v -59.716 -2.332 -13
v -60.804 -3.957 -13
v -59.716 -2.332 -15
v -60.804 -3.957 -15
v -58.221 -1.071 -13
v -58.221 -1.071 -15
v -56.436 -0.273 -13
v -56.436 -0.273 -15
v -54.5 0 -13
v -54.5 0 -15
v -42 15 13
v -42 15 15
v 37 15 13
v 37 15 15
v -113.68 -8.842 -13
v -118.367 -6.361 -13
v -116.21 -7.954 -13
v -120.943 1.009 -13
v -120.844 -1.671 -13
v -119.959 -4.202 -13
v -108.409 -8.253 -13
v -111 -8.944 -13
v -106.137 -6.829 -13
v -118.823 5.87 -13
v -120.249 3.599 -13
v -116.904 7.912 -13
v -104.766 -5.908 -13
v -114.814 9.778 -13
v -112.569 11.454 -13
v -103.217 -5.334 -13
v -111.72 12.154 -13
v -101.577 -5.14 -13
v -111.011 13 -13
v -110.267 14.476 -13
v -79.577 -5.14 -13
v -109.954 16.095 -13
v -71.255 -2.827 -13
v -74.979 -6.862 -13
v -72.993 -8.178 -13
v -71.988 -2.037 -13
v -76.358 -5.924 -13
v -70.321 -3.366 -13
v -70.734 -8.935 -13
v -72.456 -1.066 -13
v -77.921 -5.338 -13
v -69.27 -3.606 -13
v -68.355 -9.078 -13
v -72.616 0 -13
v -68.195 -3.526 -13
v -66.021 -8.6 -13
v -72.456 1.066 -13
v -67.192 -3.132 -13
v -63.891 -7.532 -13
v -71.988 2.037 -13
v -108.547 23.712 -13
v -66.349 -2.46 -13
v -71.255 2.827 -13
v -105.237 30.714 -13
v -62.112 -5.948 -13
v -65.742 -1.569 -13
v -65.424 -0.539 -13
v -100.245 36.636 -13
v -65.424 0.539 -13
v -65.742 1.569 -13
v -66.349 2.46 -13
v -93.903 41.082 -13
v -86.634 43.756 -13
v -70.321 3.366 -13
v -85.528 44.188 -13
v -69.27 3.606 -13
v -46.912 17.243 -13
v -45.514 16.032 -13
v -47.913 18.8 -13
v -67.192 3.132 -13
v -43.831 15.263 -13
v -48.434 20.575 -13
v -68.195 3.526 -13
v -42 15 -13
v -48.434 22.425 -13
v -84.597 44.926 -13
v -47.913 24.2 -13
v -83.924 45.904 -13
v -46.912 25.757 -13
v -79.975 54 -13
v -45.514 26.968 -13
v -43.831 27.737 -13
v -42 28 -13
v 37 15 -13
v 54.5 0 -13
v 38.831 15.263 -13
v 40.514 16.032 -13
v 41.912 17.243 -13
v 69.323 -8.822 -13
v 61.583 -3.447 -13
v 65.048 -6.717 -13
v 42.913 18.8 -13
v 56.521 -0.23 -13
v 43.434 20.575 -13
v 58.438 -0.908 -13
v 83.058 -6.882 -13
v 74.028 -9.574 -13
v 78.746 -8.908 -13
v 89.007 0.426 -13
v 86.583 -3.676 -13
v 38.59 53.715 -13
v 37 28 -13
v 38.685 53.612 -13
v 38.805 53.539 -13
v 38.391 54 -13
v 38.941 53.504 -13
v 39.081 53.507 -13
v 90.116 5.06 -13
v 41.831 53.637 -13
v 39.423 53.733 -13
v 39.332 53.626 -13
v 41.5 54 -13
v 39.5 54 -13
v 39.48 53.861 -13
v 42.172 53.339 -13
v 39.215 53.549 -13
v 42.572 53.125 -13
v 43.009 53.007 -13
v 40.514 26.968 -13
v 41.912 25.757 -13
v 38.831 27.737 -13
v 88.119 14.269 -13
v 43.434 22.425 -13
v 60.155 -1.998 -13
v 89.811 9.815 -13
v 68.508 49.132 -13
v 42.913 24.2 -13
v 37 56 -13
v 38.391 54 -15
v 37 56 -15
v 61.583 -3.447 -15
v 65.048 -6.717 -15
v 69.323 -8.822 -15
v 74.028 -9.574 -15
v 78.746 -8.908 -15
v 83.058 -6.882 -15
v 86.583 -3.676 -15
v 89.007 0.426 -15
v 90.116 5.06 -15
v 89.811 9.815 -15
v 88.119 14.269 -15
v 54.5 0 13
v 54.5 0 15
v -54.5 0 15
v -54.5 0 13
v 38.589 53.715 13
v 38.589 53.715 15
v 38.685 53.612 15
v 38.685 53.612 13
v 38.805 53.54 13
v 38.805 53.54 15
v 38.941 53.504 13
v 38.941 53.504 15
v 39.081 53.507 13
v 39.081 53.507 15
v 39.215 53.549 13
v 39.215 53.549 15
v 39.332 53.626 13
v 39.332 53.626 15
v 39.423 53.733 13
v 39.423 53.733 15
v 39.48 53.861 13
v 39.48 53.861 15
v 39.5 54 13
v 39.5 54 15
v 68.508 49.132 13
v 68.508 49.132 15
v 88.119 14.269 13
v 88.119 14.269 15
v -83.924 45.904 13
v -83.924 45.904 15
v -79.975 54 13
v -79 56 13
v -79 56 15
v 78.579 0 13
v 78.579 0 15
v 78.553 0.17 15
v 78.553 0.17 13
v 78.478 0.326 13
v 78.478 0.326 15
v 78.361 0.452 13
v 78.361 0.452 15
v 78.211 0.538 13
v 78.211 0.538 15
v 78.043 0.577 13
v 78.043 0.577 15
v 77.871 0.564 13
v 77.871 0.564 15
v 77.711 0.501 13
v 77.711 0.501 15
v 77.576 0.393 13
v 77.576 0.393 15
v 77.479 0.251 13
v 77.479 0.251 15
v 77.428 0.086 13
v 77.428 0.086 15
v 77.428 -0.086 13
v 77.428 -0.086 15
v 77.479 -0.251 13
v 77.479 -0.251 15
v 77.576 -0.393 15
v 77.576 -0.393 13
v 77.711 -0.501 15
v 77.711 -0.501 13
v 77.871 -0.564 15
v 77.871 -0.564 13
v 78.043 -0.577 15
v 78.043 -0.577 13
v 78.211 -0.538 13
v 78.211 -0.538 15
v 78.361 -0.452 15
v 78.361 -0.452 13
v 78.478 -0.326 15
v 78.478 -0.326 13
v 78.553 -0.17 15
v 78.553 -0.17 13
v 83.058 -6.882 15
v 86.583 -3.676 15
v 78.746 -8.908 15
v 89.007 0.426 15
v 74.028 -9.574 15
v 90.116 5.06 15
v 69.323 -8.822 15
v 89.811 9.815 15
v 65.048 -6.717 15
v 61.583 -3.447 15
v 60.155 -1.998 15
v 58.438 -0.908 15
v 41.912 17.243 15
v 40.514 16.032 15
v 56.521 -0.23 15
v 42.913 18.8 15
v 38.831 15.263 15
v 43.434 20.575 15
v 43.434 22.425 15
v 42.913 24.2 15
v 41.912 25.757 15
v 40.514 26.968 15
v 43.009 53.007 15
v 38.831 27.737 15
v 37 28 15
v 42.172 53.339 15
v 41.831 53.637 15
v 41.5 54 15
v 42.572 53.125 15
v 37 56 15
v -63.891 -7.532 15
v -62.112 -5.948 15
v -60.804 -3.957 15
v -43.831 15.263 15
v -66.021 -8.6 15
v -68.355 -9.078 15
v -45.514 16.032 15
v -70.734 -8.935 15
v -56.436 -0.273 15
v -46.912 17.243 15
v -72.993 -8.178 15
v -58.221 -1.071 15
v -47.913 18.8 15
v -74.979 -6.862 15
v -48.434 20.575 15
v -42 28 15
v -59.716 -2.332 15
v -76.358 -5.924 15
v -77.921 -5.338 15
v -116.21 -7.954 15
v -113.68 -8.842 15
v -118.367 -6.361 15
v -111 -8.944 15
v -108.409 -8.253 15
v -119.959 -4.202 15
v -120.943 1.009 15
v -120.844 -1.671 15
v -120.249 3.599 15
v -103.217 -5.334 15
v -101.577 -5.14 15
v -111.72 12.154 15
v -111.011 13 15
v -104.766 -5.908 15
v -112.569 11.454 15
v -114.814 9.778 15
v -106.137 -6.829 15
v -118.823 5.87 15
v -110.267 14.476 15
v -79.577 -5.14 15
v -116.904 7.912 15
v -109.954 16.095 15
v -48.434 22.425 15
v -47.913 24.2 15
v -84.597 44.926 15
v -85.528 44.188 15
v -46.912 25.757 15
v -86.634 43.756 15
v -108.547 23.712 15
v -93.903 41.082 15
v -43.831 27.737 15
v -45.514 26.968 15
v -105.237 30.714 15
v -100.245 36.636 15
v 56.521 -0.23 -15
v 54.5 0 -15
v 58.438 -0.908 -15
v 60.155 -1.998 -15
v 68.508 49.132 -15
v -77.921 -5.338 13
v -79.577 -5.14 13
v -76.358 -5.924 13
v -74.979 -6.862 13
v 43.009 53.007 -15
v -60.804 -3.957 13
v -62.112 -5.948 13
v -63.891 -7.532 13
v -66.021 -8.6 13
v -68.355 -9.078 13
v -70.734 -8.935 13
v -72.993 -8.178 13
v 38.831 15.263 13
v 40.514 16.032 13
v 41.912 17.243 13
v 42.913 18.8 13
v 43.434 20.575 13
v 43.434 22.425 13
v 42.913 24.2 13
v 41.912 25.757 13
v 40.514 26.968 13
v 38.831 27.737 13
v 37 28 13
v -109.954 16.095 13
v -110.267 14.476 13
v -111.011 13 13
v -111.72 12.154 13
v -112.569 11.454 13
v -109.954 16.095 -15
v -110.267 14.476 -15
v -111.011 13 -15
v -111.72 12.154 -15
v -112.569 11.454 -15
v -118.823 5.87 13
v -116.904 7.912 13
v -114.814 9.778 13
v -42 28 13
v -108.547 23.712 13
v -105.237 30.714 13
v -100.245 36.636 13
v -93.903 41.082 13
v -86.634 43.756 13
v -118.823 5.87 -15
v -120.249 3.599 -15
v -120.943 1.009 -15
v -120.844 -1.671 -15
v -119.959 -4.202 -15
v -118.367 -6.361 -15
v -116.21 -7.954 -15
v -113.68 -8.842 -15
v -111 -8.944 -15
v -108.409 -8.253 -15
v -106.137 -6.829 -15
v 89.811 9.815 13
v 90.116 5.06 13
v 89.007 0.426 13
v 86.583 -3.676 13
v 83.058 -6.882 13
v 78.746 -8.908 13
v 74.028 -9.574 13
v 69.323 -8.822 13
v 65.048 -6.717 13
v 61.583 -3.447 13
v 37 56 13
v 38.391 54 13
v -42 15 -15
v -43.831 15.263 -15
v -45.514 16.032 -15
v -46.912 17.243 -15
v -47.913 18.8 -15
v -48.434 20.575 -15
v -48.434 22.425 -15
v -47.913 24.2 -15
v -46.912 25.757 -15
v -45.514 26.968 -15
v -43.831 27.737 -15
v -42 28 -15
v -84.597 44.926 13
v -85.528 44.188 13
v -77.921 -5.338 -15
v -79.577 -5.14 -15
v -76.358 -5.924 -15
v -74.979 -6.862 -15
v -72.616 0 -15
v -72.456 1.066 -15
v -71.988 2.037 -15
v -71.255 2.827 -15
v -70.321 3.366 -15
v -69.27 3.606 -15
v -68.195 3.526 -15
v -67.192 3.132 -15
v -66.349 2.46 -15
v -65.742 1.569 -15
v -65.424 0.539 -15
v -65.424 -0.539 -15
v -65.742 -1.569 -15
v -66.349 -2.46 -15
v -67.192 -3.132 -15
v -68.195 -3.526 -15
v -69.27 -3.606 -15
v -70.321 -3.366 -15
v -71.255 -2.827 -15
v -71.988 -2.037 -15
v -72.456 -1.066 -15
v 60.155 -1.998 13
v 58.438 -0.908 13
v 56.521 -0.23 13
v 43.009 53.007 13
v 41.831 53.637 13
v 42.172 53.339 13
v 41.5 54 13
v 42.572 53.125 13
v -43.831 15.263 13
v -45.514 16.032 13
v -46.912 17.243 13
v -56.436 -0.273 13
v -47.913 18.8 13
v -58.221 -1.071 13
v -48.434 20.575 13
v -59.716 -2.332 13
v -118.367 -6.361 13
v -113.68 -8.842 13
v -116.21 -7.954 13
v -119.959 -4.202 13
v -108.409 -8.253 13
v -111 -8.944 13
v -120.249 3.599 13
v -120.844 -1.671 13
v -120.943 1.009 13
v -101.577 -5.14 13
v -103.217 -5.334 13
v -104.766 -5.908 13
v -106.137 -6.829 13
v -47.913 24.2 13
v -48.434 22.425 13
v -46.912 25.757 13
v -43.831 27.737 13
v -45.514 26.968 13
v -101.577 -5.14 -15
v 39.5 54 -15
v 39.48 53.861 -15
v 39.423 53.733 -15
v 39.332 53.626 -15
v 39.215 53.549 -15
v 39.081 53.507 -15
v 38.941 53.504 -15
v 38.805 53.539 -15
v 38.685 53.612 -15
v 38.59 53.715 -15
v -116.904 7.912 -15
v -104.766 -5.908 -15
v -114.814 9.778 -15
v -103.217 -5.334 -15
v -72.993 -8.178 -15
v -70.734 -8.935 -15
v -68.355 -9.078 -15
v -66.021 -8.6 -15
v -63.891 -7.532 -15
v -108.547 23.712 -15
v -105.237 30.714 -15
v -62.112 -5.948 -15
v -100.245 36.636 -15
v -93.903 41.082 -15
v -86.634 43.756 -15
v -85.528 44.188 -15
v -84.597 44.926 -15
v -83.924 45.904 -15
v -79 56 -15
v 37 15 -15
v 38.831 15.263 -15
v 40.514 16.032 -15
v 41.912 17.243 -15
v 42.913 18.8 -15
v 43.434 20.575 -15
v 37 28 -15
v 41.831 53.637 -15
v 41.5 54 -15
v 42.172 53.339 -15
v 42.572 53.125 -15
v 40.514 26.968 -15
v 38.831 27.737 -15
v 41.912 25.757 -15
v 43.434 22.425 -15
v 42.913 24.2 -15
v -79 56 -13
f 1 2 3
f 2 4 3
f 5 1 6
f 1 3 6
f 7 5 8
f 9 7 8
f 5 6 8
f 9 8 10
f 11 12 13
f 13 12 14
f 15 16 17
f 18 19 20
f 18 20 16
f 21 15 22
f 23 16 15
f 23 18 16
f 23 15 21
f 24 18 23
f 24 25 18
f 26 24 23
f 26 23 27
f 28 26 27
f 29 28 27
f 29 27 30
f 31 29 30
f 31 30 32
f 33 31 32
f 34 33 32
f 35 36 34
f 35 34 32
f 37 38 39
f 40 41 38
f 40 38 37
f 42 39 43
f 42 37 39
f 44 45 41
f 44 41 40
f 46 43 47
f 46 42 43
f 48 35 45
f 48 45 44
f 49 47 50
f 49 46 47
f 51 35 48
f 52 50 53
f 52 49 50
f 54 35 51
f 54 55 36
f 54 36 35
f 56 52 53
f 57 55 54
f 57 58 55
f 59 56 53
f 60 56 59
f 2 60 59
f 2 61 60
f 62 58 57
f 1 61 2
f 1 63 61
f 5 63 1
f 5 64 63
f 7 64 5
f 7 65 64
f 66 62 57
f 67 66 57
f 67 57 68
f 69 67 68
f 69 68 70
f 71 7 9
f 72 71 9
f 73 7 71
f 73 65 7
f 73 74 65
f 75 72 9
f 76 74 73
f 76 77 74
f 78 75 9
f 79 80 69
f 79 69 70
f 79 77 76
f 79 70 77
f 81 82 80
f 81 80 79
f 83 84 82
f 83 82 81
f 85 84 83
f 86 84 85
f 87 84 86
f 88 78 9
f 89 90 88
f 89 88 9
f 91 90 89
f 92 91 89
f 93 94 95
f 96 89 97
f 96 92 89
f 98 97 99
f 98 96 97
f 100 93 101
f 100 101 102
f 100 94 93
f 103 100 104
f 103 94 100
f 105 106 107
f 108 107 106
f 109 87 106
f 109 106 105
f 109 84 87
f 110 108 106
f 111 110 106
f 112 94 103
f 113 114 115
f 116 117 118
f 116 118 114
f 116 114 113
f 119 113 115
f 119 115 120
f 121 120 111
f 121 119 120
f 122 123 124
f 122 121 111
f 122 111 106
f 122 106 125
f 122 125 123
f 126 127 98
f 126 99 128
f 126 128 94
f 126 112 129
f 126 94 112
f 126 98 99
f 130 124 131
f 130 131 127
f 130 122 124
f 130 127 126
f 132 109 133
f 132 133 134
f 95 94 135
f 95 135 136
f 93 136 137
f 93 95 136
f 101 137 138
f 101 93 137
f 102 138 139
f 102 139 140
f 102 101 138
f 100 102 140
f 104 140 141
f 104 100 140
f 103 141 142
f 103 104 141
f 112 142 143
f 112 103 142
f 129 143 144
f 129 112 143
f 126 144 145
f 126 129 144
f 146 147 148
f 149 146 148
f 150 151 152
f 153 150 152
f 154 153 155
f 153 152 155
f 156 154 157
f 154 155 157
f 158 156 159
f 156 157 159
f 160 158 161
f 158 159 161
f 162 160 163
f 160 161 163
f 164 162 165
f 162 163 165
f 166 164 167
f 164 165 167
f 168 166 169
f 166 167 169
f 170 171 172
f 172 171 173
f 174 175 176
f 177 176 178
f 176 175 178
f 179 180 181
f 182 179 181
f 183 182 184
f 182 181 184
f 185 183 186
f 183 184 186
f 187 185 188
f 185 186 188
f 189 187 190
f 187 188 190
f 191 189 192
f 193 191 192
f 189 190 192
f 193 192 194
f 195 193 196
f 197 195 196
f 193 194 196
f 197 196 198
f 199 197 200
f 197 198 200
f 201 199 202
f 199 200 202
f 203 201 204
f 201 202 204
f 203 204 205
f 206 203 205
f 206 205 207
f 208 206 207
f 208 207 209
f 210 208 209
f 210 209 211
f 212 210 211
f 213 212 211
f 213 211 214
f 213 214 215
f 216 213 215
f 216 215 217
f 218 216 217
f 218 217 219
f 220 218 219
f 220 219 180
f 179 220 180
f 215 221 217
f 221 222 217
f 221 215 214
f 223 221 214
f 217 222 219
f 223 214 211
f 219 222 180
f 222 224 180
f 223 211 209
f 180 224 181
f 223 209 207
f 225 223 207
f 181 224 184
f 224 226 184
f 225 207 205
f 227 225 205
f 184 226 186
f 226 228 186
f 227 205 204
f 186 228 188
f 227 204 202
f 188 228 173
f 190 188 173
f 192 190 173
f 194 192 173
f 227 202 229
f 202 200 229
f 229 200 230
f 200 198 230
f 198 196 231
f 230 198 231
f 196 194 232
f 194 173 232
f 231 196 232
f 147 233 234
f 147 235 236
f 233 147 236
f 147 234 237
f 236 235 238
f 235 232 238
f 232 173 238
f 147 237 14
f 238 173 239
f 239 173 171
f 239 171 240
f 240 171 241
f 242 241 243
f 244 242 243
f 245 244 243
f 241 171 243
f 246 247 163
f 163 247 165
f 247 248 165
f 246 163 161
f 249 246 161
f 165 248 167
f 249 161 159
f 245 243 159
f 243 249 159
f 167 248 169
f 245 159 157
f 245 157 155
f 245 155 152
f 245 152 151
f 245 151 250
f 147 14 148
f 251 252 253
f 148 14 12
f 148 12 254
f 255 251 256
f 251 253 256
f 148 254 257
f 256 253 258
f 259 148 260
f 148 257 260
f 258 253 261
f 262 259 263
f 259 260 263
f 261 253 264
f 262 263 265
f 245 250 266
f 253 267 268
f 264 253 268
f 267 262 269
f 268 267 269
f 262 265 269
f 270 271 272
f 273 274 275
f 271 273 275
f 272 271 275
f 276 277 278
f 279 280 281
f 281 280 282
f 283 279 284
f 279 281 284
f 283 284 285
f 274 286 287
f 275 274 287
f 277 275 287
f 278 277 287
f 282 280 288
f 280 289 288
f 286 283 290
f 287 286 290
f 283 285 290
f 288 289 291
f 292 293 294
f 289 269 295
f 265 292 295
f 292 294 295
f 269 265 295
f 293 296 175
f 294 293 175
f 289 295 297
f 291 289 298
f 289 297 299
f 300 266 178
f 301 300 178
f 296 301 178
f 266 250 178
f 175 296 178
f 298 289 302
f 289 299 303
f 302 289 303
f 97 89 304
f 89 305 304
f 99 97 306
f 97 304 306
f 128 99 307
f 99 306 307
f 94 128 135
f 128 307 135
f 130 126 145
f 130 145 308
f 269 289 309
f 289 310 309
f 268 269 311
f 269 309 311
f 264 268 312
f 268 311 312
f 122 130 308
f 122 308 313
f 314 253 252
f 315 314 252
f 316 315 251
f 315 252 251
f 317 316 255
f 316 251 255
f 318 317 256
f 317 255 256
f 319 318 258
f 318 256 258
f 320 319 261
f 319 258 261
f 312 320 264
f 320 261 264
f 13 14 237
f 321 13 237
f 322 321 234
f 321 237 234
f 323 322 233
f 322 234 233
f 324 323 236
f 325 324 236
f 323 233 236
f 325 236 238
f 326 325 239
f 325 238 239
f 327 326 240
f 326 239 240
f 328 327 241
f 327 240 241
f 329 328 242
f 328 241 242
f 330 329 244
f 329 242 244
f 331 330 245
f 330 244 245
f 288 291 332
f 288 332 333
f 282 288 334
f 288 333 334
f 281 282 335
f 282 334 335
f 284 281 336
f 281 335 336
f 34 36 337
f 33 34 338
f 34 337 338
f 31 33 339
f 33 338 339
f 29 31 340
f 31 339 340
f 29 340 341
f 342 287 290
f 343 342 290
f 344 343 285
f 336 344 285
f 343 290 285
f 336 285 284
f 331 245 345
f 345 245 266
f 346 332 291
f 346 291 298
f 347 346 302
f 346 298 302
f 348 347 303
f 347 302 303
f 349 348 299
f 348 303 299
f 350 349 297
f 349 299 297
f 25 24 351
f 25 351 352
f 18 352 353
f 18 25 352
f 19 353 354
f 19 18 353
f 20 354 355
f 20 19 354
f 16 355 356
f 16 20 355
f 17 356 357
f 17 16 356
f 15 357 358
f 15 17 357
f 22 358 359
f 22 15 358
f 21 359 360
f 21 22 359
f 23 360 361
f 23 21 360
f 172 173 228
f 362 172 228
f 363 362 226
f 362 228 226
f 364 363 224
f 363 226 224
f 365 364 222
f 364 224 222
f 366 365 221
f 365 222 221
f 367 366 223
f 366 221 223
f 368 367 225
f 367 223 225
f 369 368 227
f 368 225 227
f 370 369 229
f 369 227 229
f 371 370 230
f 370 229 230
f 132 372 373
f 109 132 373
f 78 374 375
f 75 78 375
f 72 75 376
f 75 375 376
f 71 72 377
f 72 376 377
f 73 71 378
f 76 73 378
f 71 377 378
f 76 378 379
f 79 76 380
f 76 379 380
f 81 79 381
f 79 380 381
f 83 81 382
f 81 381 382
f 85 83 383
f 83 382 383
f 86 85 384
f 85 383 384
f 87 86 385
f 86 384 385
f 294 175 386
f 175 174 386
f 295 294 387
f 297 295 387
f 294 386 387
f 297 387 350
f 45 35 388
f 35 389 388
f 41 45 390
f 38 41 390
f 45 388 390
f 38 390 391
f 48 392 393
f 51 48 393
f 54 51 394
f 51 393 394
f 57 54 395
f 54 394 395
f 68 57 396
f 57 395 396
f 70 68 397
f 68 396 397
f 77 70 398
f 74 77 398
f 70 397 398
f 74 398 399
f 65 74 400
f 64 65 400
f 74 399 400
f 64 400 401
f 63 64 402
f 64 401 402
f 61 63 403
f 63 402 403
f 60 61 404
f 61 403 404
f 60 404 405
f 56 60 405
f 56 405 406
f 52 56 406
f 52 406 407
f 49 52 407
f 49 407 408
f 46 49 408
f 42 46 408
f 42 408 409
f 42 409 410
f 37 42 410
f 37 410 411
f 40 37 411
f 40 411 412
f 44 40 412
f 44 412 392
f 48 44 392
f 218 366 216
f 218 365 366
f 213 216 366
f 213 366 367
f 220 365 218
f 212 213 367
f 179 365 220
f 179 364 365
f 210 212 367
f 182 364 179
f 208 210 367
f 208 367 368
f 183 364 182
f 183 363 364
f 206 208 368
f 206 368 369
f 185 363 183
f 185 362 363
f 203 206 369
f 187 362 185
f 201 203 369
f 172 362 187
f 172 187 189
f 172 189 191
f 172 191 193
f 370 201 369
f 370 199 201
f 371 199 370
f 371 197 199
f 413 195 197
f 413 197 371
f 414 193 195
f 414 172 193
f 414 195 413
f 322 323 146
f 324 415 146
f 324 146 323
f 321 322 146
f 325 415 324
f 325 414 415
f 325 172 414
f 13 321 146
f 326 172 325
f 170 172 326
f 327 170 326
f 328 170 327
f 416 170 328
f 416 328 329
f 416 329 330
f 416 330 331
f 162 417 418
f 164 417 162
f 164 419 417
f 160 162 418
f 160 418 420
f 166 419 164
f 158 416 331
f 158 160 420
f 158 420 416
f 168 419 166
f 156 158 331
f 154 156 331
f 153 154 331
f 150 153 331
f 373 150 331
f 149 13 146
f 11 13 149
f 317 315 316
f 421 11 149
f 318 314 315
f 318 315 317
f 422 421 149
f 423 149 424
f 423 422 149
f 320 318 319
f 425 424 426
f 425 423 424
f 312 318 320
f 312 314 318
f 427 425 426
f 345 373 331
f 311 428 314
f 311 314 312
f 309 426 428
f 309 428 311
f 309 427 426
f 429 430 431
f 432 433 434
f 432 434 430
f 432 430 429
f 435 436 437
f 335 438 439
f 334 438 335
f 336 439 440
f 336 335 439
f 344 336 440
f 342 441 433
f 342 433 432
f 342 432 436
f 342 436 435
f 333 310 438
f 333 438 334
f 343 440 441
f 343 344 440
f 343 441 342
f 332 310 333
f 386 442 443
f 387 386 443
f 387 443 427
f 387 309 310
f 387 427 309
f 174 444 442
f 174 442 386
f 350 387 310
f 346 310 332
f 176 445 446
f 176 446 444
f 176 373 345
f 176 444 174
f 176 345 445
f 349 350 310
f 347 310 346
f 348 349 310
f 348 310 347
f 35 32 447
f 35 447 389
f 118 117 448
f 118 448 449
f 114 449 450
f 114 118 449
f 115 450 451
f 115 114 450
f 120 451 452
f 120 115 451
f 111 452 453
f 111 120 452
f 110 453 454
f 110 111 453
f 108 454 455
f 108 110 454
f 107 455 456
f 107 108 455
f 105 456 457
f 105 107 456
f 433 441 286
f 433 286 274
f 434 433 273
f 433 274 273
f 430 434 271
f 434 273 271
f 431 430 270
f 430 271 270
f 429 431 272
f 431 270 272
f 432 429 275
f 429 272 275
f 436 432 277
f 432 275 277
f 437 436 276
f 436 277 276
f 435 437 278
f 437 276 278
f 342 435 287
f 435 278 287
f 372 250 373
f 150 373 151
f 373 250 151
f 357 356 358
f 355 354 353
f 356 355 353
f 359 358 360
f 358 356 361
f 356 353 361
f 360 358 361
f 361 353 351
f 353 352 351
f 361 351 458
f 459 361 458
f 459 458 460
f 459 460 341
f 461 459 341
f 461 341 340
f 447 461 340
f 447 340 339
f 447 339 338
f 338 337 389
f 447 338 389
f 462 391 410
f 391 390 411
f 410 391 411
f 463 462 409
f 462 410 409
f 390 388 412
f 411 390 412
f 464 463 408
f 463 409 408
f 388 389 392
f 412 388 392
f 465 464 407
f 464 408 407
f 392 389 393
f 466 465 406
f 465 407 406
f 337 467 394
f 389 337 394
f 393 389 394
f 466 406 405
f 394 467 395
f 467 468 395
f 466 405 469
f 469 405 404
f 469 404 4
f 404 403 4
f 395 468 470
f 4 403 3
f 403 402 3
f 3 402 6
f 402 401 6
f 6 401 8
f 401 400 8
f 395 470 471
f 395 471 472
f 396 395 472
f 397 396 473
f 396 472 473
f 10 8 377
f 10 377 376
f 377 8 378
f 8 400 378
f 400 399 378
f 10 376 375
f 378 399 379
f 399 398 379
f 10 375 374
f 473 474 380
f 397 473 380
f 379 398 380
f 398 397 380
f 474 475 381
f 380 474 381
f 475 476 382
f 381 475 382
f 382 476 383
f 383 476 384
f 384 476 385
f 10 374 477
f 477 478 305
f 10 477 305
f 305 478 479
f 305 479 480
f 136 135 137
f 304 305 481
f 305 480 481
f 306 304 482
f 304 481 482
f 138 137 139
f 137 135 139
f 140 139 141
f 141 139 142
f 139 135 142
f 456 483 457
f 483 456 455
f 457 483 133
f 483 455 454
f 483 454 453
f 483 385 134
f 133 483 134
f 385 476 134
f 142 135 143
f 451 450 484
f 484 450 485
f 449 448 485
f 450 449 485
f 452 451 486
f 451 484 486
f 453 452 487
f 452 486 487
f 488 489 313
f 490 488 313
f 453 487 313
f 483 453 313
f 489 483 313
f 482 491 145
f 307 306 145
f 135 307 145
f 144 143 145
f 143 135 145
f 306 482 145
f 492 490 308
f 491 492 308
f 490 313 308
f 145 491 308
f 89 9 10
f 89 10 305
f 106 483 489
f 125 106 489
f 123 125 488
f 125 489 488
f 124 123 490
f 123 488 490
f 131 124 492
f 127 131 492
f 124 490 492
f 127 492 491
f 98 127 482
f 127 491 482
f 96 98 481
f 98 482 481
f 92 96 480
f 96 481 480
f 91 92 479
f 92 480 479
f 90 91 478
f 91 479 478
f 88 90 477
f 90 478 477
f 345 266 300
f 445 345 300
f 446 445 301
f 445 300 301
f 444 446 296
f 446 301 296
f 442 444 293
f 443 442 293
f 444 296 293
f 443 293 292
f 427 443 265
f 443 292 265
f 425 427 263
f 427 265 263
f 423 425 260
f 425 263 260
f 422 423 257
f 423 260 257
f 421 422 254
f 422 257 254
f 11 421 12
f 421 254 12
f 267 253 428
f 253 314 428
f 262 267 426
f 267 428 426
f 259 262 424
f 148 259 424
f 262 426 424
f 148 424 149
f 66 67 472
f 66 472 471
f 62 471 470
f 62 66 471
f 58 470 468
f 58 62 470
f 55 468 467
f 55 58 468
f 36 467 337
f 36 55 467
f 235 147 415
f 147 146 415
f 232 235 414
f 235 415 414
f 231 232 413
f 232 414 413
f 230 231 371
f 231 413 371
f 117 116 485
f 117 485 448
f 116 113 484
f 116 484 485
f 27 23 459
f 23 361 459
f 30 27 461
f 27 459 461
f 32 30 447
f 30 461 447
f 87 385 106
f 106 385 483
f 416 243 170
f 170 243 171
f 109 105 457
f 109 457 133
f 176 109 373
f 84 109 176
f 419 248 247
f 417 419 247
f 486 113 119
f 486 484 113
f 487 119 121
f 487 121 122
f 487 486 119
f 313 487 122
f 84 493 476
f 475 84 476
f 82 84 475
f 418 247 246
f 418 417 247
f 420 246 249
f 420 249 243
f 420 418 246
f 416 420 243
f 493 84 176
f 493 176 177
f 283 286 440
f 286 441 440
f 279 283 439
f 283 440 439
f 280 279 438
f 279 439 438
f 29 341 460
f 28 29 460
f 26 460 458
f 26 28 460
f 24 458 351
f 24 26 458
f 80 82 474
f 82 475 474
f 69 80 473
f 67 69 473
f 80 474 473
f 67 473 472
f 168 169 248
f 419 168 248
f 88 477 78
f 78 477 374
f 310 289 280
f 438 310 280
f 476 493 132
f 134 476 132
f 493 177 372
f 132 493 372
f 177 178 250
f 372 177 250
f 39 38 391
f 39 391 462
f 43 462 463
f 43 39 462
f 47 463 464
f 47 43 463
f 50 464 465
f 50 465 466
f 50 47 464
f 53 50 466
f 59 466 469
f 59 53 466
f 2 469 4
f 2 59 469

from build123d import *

# Parameters (mm, degrees)
BOSS_EXTRUDE1_DEPTH = 2
BOSS_EXTRUDE2_DEPTH = 26
BOSS_EXTRUDE3_START = 2
BOSS_EXTRUDE3_DEPTH = 2
CUT_EXTRUDE1_REACH  = 138.664
CUT_EXTRUDE2_DEPTH  = 137.663822213
HOLE1_D             = 1.156713631
HOLE1_DEPTH         = 2
HOLE2_D             = 7.232882037
HOLE2_DEPTH         = 2
FILLET1_R           = 2
FILLET2_R           = 4
FILLET3_R           = 6
FILLET4_R           = 7
FILLET5_R           = 9


with BuildPart() as part:
    # Sketch1 → Boss-Extrude1 (new body)
    with BuildSketch(Plane.XY.offset(-13)):
        with BuildLine():
            Line((38.589514728, 53.714517423), (38.390964743, 54.000002708))
            Line((38.390964743, 54.000002708), (37, 56.000002696))
            Line((37, 56.000002696), (-79, 56.000002696))
            Line((-79, 56.000002696), (-84.797547627, 44.113268525))
            ThreePointArc((-84.797547627, 44.113268525), (-103.30638504, 33.384611029), (-109.961112948, 13.052475123))
            ThreePointArc((-109.961112948, 13.052475123), (-114.714513302, 9.85906483), (-118.822624433, 5.869565217))
            ThreePointArc((-118.822624433, 5.869565217), (-117.511822587, -7.114760135), (-104.611841725, -5.139563921))
            Line((-104.611841725, -5.139563921), (-76.511157838, -5.139563921))
            ThreePointArc((-76.511157838, -5.139563921), (-66.310042494, -8.694638462), (-59.898757812, 0))
            Line((-59.898757812, 0), (59.520798297, 0))
            ThreePointArc((59.520798297, 0), (81.317661031, -7.891849144), (88.119135563, 14.269478708))
            Line((88.119135563, 14.269478708), (68.507754464, 49.131976199))
            Line((68.507754464, 49.131976199), (42.308532947, 53.113281503))
            Line((42.308532947, 53.113281503), (41.5, 54.000002696))
            Line((41.5, 54.000002696), (39.5, 54.000002696))
            ThreePointArc((39.5, 54.000002696), (39.14959506, 53.522905936), (38.589514728, 53.714517423))
        make_face()
    extrude(amount=-BOSS_EXTRUDE1_DEPTH)

    # Sketch2 → Boss-Extrude2 (add)
    with BuildSketch(Plane.XY.offset(-13)):
        Polygon((37, 56.000002696), (38.390964806, 54.000002752), (-79.97546515, 54.000002752), (-79, 56.000002696), align=None)
    extrude(amount=BOSS_EXTRUDE2_DEPTH)

    # Sketch3 → Boss-Extrude3 (add)
    with BuildSketch(Plane.XY.offset(13).offset(BOSS_EXTRUDE3_START)):
        with BuildLine():
            Line((39.500000002, 54.000002689), (41.499999991, 54.000002689))
            Line((41.499999991, 54.000002689), (42.308532938, 53.113281497))
            Line((42.308532938, 53.113281497), (68.507754455, 49.131976193))
            Line((68.507754455, 49.131976193), (88.119135607, 14.269478608))
            ThreePointArc((88.119135607, 14.269478608), (81.317661026, -7.891849269), (59.520798297, 0))
            Line((59.520798297, 0), (-59.898757812, 0))
            ThreePointArc((-59.898757812, 0), (-66.310042494, -8.694638462), (-76.511157838, -5.139563921))
            Line((-76.511157838, -5.139563921), (-104.611841725, -5.139563921))
            ThreePointArc((-104.611841725, -5.139563921), (-117.511822587, -7.114760135), (-118.822624433, 5.869565217))
            ThreePointArc((-118.822624433, 5.869565217), (-114.714513302, 9.85906483), (-109.961112948, 13.052475123))
            ThreePointArc((-109.961112948, 13.052475123), (-103.30638504, 33.384611029), (-84.797547627, 44.113268525))
            Line((-84.797547627, 44.113268525), (-79, 56.000002696))
            Line((-79, 56.000002696), (37, 56.000002696))
            Line((37, 56.000002696), (38.589345234, 53.714761246))
            ThreePointArc((38.589345234, 53.714761246), (39.149453375, 53.522861518), (39.500000002, 54.000002689))
        make_face()
    extrude(amount=-BOSS_EXTRUDE3_DEPTH)

    # Sketch4 → Cut-Extrude1 (cut, up to next)
    with BuildSketch(Plane(origin=(0, 0, -15), x_dir=(-1, 0, 0), z_dir=(0, 0, -1)), mode=Mode.PRIVATE) as cut_extrude1_sk1:
        with BuildLine():
            Line((-37, 14.999963704), (42, 14.999963704))
            ThreePointArc((42, 14.999963704), (48.5, 21.499963704), (42, 27.999963704))
            Line((42, 27.999963704), (-37, 27.999963704))
            ThreePointArc((-37, 27.999963704), (-43.5, 21.499963704), (-37, 14.999963704))
        make_face()
    cut_extrude1_tool1 = extrude(cut_extrude1_sk1.sketch, amount=-CUT_EXTRUDE1_REACH, mode=Mode.PRIVATE) & part.part
    add(cut_extrude1_tool1.solids().sort_by_distance((-2.5, 21.499964, -15))[0], mode=Mode.SUBTRACT)

    # Sketch5 → Cut-Extrude2 (cut, through all)
    with BuildSketch(Plane.XY.offset(15)):
        with BuildLine():
            Line((37, 27.999963704), (-42, 27.999963704))
            ThreePointArc((-42, 27.999963704), (-48.5, 21.499963704), (-42, 14.999963704))
            Line((-42, 14.999963704), (37, 14.999963704))
            ThreePointArc((37, 14.999963704), (43.5, 21.499963704), (37, 27.999963704))
        make_face()
    extrude(amount=-CUT_EXTRUDE2_DEPTH, mode=Mode.SUBTRACT)

    # Hole1
    with Locations(Plane(origin=(0, 0, 13), x_dir=(-1, 0, 0), z_dir=(0, 0, -1))):
        with Locations((-78.000162744, 0)):
            Hole(HOLE1_D / 2, depth=HOLE1_DEPTH)

    # Hole2
    with Locations(Plane.XY.offset(-13)):
        with Locations((-69, 0)):
            Hole(HOLE2_D / 2, depth=HOLE2_DEPTH)

    # Fillet1
    fillet1_edges = [part.edges().sort_by_distance(p)[0] for p in [
        (42.308532947, 53.113281503, -14),
        (42.308532938, 53.113281497, 14),
    ]]
    fillet(fillet1_edges, radius=FILLET1_R)

    # Fillet2
    fillet2_edges = [part.edges().sort_by_distance(p)[0] for p in [
        (-84.797547627, 44.113268525, -14),
        (-84.797547627, 44.113268525, 14),
    ]]
    fillet(fillet2_edges, radius=FILLET2_R)

    # Fillet3
    fillet3_edges = [part.edges().sort_by_distance(p)[0] for p in [
        (-109.961112948, 13.052475123, -14),
        (-109.961112948, 13.052475123, 14),
    ]]
    fillet(fillet3_edges, radius=FILLET3_R)

    # Fillet4
    fillet4_edges = [part.edges().sort_by_distance(p)[0] for p in [
        (-59.898757812, 0, -14),
        (-76.511157838, -5.139563921, -14),
        (-104.611841725, -5.139563921, -14),
        (-104.611841725, -5.139563921, 14),
        (-76.511157838, -5.139563921, 14),
        (-59.898757812, 0, 14),
    ]]
    fillet(fillet4_edges, radius=FILLET4_R)

    # Fillet5
    fillet5_edges = [part.edges().sort_by_distance(p)[0] for p in [
        (59.520798297, 0, -14),
        (59.520798297, 0, 14),
    ]]
    fillet(fillet5_edges, radius=FILLET5_R)


solid = part.part
